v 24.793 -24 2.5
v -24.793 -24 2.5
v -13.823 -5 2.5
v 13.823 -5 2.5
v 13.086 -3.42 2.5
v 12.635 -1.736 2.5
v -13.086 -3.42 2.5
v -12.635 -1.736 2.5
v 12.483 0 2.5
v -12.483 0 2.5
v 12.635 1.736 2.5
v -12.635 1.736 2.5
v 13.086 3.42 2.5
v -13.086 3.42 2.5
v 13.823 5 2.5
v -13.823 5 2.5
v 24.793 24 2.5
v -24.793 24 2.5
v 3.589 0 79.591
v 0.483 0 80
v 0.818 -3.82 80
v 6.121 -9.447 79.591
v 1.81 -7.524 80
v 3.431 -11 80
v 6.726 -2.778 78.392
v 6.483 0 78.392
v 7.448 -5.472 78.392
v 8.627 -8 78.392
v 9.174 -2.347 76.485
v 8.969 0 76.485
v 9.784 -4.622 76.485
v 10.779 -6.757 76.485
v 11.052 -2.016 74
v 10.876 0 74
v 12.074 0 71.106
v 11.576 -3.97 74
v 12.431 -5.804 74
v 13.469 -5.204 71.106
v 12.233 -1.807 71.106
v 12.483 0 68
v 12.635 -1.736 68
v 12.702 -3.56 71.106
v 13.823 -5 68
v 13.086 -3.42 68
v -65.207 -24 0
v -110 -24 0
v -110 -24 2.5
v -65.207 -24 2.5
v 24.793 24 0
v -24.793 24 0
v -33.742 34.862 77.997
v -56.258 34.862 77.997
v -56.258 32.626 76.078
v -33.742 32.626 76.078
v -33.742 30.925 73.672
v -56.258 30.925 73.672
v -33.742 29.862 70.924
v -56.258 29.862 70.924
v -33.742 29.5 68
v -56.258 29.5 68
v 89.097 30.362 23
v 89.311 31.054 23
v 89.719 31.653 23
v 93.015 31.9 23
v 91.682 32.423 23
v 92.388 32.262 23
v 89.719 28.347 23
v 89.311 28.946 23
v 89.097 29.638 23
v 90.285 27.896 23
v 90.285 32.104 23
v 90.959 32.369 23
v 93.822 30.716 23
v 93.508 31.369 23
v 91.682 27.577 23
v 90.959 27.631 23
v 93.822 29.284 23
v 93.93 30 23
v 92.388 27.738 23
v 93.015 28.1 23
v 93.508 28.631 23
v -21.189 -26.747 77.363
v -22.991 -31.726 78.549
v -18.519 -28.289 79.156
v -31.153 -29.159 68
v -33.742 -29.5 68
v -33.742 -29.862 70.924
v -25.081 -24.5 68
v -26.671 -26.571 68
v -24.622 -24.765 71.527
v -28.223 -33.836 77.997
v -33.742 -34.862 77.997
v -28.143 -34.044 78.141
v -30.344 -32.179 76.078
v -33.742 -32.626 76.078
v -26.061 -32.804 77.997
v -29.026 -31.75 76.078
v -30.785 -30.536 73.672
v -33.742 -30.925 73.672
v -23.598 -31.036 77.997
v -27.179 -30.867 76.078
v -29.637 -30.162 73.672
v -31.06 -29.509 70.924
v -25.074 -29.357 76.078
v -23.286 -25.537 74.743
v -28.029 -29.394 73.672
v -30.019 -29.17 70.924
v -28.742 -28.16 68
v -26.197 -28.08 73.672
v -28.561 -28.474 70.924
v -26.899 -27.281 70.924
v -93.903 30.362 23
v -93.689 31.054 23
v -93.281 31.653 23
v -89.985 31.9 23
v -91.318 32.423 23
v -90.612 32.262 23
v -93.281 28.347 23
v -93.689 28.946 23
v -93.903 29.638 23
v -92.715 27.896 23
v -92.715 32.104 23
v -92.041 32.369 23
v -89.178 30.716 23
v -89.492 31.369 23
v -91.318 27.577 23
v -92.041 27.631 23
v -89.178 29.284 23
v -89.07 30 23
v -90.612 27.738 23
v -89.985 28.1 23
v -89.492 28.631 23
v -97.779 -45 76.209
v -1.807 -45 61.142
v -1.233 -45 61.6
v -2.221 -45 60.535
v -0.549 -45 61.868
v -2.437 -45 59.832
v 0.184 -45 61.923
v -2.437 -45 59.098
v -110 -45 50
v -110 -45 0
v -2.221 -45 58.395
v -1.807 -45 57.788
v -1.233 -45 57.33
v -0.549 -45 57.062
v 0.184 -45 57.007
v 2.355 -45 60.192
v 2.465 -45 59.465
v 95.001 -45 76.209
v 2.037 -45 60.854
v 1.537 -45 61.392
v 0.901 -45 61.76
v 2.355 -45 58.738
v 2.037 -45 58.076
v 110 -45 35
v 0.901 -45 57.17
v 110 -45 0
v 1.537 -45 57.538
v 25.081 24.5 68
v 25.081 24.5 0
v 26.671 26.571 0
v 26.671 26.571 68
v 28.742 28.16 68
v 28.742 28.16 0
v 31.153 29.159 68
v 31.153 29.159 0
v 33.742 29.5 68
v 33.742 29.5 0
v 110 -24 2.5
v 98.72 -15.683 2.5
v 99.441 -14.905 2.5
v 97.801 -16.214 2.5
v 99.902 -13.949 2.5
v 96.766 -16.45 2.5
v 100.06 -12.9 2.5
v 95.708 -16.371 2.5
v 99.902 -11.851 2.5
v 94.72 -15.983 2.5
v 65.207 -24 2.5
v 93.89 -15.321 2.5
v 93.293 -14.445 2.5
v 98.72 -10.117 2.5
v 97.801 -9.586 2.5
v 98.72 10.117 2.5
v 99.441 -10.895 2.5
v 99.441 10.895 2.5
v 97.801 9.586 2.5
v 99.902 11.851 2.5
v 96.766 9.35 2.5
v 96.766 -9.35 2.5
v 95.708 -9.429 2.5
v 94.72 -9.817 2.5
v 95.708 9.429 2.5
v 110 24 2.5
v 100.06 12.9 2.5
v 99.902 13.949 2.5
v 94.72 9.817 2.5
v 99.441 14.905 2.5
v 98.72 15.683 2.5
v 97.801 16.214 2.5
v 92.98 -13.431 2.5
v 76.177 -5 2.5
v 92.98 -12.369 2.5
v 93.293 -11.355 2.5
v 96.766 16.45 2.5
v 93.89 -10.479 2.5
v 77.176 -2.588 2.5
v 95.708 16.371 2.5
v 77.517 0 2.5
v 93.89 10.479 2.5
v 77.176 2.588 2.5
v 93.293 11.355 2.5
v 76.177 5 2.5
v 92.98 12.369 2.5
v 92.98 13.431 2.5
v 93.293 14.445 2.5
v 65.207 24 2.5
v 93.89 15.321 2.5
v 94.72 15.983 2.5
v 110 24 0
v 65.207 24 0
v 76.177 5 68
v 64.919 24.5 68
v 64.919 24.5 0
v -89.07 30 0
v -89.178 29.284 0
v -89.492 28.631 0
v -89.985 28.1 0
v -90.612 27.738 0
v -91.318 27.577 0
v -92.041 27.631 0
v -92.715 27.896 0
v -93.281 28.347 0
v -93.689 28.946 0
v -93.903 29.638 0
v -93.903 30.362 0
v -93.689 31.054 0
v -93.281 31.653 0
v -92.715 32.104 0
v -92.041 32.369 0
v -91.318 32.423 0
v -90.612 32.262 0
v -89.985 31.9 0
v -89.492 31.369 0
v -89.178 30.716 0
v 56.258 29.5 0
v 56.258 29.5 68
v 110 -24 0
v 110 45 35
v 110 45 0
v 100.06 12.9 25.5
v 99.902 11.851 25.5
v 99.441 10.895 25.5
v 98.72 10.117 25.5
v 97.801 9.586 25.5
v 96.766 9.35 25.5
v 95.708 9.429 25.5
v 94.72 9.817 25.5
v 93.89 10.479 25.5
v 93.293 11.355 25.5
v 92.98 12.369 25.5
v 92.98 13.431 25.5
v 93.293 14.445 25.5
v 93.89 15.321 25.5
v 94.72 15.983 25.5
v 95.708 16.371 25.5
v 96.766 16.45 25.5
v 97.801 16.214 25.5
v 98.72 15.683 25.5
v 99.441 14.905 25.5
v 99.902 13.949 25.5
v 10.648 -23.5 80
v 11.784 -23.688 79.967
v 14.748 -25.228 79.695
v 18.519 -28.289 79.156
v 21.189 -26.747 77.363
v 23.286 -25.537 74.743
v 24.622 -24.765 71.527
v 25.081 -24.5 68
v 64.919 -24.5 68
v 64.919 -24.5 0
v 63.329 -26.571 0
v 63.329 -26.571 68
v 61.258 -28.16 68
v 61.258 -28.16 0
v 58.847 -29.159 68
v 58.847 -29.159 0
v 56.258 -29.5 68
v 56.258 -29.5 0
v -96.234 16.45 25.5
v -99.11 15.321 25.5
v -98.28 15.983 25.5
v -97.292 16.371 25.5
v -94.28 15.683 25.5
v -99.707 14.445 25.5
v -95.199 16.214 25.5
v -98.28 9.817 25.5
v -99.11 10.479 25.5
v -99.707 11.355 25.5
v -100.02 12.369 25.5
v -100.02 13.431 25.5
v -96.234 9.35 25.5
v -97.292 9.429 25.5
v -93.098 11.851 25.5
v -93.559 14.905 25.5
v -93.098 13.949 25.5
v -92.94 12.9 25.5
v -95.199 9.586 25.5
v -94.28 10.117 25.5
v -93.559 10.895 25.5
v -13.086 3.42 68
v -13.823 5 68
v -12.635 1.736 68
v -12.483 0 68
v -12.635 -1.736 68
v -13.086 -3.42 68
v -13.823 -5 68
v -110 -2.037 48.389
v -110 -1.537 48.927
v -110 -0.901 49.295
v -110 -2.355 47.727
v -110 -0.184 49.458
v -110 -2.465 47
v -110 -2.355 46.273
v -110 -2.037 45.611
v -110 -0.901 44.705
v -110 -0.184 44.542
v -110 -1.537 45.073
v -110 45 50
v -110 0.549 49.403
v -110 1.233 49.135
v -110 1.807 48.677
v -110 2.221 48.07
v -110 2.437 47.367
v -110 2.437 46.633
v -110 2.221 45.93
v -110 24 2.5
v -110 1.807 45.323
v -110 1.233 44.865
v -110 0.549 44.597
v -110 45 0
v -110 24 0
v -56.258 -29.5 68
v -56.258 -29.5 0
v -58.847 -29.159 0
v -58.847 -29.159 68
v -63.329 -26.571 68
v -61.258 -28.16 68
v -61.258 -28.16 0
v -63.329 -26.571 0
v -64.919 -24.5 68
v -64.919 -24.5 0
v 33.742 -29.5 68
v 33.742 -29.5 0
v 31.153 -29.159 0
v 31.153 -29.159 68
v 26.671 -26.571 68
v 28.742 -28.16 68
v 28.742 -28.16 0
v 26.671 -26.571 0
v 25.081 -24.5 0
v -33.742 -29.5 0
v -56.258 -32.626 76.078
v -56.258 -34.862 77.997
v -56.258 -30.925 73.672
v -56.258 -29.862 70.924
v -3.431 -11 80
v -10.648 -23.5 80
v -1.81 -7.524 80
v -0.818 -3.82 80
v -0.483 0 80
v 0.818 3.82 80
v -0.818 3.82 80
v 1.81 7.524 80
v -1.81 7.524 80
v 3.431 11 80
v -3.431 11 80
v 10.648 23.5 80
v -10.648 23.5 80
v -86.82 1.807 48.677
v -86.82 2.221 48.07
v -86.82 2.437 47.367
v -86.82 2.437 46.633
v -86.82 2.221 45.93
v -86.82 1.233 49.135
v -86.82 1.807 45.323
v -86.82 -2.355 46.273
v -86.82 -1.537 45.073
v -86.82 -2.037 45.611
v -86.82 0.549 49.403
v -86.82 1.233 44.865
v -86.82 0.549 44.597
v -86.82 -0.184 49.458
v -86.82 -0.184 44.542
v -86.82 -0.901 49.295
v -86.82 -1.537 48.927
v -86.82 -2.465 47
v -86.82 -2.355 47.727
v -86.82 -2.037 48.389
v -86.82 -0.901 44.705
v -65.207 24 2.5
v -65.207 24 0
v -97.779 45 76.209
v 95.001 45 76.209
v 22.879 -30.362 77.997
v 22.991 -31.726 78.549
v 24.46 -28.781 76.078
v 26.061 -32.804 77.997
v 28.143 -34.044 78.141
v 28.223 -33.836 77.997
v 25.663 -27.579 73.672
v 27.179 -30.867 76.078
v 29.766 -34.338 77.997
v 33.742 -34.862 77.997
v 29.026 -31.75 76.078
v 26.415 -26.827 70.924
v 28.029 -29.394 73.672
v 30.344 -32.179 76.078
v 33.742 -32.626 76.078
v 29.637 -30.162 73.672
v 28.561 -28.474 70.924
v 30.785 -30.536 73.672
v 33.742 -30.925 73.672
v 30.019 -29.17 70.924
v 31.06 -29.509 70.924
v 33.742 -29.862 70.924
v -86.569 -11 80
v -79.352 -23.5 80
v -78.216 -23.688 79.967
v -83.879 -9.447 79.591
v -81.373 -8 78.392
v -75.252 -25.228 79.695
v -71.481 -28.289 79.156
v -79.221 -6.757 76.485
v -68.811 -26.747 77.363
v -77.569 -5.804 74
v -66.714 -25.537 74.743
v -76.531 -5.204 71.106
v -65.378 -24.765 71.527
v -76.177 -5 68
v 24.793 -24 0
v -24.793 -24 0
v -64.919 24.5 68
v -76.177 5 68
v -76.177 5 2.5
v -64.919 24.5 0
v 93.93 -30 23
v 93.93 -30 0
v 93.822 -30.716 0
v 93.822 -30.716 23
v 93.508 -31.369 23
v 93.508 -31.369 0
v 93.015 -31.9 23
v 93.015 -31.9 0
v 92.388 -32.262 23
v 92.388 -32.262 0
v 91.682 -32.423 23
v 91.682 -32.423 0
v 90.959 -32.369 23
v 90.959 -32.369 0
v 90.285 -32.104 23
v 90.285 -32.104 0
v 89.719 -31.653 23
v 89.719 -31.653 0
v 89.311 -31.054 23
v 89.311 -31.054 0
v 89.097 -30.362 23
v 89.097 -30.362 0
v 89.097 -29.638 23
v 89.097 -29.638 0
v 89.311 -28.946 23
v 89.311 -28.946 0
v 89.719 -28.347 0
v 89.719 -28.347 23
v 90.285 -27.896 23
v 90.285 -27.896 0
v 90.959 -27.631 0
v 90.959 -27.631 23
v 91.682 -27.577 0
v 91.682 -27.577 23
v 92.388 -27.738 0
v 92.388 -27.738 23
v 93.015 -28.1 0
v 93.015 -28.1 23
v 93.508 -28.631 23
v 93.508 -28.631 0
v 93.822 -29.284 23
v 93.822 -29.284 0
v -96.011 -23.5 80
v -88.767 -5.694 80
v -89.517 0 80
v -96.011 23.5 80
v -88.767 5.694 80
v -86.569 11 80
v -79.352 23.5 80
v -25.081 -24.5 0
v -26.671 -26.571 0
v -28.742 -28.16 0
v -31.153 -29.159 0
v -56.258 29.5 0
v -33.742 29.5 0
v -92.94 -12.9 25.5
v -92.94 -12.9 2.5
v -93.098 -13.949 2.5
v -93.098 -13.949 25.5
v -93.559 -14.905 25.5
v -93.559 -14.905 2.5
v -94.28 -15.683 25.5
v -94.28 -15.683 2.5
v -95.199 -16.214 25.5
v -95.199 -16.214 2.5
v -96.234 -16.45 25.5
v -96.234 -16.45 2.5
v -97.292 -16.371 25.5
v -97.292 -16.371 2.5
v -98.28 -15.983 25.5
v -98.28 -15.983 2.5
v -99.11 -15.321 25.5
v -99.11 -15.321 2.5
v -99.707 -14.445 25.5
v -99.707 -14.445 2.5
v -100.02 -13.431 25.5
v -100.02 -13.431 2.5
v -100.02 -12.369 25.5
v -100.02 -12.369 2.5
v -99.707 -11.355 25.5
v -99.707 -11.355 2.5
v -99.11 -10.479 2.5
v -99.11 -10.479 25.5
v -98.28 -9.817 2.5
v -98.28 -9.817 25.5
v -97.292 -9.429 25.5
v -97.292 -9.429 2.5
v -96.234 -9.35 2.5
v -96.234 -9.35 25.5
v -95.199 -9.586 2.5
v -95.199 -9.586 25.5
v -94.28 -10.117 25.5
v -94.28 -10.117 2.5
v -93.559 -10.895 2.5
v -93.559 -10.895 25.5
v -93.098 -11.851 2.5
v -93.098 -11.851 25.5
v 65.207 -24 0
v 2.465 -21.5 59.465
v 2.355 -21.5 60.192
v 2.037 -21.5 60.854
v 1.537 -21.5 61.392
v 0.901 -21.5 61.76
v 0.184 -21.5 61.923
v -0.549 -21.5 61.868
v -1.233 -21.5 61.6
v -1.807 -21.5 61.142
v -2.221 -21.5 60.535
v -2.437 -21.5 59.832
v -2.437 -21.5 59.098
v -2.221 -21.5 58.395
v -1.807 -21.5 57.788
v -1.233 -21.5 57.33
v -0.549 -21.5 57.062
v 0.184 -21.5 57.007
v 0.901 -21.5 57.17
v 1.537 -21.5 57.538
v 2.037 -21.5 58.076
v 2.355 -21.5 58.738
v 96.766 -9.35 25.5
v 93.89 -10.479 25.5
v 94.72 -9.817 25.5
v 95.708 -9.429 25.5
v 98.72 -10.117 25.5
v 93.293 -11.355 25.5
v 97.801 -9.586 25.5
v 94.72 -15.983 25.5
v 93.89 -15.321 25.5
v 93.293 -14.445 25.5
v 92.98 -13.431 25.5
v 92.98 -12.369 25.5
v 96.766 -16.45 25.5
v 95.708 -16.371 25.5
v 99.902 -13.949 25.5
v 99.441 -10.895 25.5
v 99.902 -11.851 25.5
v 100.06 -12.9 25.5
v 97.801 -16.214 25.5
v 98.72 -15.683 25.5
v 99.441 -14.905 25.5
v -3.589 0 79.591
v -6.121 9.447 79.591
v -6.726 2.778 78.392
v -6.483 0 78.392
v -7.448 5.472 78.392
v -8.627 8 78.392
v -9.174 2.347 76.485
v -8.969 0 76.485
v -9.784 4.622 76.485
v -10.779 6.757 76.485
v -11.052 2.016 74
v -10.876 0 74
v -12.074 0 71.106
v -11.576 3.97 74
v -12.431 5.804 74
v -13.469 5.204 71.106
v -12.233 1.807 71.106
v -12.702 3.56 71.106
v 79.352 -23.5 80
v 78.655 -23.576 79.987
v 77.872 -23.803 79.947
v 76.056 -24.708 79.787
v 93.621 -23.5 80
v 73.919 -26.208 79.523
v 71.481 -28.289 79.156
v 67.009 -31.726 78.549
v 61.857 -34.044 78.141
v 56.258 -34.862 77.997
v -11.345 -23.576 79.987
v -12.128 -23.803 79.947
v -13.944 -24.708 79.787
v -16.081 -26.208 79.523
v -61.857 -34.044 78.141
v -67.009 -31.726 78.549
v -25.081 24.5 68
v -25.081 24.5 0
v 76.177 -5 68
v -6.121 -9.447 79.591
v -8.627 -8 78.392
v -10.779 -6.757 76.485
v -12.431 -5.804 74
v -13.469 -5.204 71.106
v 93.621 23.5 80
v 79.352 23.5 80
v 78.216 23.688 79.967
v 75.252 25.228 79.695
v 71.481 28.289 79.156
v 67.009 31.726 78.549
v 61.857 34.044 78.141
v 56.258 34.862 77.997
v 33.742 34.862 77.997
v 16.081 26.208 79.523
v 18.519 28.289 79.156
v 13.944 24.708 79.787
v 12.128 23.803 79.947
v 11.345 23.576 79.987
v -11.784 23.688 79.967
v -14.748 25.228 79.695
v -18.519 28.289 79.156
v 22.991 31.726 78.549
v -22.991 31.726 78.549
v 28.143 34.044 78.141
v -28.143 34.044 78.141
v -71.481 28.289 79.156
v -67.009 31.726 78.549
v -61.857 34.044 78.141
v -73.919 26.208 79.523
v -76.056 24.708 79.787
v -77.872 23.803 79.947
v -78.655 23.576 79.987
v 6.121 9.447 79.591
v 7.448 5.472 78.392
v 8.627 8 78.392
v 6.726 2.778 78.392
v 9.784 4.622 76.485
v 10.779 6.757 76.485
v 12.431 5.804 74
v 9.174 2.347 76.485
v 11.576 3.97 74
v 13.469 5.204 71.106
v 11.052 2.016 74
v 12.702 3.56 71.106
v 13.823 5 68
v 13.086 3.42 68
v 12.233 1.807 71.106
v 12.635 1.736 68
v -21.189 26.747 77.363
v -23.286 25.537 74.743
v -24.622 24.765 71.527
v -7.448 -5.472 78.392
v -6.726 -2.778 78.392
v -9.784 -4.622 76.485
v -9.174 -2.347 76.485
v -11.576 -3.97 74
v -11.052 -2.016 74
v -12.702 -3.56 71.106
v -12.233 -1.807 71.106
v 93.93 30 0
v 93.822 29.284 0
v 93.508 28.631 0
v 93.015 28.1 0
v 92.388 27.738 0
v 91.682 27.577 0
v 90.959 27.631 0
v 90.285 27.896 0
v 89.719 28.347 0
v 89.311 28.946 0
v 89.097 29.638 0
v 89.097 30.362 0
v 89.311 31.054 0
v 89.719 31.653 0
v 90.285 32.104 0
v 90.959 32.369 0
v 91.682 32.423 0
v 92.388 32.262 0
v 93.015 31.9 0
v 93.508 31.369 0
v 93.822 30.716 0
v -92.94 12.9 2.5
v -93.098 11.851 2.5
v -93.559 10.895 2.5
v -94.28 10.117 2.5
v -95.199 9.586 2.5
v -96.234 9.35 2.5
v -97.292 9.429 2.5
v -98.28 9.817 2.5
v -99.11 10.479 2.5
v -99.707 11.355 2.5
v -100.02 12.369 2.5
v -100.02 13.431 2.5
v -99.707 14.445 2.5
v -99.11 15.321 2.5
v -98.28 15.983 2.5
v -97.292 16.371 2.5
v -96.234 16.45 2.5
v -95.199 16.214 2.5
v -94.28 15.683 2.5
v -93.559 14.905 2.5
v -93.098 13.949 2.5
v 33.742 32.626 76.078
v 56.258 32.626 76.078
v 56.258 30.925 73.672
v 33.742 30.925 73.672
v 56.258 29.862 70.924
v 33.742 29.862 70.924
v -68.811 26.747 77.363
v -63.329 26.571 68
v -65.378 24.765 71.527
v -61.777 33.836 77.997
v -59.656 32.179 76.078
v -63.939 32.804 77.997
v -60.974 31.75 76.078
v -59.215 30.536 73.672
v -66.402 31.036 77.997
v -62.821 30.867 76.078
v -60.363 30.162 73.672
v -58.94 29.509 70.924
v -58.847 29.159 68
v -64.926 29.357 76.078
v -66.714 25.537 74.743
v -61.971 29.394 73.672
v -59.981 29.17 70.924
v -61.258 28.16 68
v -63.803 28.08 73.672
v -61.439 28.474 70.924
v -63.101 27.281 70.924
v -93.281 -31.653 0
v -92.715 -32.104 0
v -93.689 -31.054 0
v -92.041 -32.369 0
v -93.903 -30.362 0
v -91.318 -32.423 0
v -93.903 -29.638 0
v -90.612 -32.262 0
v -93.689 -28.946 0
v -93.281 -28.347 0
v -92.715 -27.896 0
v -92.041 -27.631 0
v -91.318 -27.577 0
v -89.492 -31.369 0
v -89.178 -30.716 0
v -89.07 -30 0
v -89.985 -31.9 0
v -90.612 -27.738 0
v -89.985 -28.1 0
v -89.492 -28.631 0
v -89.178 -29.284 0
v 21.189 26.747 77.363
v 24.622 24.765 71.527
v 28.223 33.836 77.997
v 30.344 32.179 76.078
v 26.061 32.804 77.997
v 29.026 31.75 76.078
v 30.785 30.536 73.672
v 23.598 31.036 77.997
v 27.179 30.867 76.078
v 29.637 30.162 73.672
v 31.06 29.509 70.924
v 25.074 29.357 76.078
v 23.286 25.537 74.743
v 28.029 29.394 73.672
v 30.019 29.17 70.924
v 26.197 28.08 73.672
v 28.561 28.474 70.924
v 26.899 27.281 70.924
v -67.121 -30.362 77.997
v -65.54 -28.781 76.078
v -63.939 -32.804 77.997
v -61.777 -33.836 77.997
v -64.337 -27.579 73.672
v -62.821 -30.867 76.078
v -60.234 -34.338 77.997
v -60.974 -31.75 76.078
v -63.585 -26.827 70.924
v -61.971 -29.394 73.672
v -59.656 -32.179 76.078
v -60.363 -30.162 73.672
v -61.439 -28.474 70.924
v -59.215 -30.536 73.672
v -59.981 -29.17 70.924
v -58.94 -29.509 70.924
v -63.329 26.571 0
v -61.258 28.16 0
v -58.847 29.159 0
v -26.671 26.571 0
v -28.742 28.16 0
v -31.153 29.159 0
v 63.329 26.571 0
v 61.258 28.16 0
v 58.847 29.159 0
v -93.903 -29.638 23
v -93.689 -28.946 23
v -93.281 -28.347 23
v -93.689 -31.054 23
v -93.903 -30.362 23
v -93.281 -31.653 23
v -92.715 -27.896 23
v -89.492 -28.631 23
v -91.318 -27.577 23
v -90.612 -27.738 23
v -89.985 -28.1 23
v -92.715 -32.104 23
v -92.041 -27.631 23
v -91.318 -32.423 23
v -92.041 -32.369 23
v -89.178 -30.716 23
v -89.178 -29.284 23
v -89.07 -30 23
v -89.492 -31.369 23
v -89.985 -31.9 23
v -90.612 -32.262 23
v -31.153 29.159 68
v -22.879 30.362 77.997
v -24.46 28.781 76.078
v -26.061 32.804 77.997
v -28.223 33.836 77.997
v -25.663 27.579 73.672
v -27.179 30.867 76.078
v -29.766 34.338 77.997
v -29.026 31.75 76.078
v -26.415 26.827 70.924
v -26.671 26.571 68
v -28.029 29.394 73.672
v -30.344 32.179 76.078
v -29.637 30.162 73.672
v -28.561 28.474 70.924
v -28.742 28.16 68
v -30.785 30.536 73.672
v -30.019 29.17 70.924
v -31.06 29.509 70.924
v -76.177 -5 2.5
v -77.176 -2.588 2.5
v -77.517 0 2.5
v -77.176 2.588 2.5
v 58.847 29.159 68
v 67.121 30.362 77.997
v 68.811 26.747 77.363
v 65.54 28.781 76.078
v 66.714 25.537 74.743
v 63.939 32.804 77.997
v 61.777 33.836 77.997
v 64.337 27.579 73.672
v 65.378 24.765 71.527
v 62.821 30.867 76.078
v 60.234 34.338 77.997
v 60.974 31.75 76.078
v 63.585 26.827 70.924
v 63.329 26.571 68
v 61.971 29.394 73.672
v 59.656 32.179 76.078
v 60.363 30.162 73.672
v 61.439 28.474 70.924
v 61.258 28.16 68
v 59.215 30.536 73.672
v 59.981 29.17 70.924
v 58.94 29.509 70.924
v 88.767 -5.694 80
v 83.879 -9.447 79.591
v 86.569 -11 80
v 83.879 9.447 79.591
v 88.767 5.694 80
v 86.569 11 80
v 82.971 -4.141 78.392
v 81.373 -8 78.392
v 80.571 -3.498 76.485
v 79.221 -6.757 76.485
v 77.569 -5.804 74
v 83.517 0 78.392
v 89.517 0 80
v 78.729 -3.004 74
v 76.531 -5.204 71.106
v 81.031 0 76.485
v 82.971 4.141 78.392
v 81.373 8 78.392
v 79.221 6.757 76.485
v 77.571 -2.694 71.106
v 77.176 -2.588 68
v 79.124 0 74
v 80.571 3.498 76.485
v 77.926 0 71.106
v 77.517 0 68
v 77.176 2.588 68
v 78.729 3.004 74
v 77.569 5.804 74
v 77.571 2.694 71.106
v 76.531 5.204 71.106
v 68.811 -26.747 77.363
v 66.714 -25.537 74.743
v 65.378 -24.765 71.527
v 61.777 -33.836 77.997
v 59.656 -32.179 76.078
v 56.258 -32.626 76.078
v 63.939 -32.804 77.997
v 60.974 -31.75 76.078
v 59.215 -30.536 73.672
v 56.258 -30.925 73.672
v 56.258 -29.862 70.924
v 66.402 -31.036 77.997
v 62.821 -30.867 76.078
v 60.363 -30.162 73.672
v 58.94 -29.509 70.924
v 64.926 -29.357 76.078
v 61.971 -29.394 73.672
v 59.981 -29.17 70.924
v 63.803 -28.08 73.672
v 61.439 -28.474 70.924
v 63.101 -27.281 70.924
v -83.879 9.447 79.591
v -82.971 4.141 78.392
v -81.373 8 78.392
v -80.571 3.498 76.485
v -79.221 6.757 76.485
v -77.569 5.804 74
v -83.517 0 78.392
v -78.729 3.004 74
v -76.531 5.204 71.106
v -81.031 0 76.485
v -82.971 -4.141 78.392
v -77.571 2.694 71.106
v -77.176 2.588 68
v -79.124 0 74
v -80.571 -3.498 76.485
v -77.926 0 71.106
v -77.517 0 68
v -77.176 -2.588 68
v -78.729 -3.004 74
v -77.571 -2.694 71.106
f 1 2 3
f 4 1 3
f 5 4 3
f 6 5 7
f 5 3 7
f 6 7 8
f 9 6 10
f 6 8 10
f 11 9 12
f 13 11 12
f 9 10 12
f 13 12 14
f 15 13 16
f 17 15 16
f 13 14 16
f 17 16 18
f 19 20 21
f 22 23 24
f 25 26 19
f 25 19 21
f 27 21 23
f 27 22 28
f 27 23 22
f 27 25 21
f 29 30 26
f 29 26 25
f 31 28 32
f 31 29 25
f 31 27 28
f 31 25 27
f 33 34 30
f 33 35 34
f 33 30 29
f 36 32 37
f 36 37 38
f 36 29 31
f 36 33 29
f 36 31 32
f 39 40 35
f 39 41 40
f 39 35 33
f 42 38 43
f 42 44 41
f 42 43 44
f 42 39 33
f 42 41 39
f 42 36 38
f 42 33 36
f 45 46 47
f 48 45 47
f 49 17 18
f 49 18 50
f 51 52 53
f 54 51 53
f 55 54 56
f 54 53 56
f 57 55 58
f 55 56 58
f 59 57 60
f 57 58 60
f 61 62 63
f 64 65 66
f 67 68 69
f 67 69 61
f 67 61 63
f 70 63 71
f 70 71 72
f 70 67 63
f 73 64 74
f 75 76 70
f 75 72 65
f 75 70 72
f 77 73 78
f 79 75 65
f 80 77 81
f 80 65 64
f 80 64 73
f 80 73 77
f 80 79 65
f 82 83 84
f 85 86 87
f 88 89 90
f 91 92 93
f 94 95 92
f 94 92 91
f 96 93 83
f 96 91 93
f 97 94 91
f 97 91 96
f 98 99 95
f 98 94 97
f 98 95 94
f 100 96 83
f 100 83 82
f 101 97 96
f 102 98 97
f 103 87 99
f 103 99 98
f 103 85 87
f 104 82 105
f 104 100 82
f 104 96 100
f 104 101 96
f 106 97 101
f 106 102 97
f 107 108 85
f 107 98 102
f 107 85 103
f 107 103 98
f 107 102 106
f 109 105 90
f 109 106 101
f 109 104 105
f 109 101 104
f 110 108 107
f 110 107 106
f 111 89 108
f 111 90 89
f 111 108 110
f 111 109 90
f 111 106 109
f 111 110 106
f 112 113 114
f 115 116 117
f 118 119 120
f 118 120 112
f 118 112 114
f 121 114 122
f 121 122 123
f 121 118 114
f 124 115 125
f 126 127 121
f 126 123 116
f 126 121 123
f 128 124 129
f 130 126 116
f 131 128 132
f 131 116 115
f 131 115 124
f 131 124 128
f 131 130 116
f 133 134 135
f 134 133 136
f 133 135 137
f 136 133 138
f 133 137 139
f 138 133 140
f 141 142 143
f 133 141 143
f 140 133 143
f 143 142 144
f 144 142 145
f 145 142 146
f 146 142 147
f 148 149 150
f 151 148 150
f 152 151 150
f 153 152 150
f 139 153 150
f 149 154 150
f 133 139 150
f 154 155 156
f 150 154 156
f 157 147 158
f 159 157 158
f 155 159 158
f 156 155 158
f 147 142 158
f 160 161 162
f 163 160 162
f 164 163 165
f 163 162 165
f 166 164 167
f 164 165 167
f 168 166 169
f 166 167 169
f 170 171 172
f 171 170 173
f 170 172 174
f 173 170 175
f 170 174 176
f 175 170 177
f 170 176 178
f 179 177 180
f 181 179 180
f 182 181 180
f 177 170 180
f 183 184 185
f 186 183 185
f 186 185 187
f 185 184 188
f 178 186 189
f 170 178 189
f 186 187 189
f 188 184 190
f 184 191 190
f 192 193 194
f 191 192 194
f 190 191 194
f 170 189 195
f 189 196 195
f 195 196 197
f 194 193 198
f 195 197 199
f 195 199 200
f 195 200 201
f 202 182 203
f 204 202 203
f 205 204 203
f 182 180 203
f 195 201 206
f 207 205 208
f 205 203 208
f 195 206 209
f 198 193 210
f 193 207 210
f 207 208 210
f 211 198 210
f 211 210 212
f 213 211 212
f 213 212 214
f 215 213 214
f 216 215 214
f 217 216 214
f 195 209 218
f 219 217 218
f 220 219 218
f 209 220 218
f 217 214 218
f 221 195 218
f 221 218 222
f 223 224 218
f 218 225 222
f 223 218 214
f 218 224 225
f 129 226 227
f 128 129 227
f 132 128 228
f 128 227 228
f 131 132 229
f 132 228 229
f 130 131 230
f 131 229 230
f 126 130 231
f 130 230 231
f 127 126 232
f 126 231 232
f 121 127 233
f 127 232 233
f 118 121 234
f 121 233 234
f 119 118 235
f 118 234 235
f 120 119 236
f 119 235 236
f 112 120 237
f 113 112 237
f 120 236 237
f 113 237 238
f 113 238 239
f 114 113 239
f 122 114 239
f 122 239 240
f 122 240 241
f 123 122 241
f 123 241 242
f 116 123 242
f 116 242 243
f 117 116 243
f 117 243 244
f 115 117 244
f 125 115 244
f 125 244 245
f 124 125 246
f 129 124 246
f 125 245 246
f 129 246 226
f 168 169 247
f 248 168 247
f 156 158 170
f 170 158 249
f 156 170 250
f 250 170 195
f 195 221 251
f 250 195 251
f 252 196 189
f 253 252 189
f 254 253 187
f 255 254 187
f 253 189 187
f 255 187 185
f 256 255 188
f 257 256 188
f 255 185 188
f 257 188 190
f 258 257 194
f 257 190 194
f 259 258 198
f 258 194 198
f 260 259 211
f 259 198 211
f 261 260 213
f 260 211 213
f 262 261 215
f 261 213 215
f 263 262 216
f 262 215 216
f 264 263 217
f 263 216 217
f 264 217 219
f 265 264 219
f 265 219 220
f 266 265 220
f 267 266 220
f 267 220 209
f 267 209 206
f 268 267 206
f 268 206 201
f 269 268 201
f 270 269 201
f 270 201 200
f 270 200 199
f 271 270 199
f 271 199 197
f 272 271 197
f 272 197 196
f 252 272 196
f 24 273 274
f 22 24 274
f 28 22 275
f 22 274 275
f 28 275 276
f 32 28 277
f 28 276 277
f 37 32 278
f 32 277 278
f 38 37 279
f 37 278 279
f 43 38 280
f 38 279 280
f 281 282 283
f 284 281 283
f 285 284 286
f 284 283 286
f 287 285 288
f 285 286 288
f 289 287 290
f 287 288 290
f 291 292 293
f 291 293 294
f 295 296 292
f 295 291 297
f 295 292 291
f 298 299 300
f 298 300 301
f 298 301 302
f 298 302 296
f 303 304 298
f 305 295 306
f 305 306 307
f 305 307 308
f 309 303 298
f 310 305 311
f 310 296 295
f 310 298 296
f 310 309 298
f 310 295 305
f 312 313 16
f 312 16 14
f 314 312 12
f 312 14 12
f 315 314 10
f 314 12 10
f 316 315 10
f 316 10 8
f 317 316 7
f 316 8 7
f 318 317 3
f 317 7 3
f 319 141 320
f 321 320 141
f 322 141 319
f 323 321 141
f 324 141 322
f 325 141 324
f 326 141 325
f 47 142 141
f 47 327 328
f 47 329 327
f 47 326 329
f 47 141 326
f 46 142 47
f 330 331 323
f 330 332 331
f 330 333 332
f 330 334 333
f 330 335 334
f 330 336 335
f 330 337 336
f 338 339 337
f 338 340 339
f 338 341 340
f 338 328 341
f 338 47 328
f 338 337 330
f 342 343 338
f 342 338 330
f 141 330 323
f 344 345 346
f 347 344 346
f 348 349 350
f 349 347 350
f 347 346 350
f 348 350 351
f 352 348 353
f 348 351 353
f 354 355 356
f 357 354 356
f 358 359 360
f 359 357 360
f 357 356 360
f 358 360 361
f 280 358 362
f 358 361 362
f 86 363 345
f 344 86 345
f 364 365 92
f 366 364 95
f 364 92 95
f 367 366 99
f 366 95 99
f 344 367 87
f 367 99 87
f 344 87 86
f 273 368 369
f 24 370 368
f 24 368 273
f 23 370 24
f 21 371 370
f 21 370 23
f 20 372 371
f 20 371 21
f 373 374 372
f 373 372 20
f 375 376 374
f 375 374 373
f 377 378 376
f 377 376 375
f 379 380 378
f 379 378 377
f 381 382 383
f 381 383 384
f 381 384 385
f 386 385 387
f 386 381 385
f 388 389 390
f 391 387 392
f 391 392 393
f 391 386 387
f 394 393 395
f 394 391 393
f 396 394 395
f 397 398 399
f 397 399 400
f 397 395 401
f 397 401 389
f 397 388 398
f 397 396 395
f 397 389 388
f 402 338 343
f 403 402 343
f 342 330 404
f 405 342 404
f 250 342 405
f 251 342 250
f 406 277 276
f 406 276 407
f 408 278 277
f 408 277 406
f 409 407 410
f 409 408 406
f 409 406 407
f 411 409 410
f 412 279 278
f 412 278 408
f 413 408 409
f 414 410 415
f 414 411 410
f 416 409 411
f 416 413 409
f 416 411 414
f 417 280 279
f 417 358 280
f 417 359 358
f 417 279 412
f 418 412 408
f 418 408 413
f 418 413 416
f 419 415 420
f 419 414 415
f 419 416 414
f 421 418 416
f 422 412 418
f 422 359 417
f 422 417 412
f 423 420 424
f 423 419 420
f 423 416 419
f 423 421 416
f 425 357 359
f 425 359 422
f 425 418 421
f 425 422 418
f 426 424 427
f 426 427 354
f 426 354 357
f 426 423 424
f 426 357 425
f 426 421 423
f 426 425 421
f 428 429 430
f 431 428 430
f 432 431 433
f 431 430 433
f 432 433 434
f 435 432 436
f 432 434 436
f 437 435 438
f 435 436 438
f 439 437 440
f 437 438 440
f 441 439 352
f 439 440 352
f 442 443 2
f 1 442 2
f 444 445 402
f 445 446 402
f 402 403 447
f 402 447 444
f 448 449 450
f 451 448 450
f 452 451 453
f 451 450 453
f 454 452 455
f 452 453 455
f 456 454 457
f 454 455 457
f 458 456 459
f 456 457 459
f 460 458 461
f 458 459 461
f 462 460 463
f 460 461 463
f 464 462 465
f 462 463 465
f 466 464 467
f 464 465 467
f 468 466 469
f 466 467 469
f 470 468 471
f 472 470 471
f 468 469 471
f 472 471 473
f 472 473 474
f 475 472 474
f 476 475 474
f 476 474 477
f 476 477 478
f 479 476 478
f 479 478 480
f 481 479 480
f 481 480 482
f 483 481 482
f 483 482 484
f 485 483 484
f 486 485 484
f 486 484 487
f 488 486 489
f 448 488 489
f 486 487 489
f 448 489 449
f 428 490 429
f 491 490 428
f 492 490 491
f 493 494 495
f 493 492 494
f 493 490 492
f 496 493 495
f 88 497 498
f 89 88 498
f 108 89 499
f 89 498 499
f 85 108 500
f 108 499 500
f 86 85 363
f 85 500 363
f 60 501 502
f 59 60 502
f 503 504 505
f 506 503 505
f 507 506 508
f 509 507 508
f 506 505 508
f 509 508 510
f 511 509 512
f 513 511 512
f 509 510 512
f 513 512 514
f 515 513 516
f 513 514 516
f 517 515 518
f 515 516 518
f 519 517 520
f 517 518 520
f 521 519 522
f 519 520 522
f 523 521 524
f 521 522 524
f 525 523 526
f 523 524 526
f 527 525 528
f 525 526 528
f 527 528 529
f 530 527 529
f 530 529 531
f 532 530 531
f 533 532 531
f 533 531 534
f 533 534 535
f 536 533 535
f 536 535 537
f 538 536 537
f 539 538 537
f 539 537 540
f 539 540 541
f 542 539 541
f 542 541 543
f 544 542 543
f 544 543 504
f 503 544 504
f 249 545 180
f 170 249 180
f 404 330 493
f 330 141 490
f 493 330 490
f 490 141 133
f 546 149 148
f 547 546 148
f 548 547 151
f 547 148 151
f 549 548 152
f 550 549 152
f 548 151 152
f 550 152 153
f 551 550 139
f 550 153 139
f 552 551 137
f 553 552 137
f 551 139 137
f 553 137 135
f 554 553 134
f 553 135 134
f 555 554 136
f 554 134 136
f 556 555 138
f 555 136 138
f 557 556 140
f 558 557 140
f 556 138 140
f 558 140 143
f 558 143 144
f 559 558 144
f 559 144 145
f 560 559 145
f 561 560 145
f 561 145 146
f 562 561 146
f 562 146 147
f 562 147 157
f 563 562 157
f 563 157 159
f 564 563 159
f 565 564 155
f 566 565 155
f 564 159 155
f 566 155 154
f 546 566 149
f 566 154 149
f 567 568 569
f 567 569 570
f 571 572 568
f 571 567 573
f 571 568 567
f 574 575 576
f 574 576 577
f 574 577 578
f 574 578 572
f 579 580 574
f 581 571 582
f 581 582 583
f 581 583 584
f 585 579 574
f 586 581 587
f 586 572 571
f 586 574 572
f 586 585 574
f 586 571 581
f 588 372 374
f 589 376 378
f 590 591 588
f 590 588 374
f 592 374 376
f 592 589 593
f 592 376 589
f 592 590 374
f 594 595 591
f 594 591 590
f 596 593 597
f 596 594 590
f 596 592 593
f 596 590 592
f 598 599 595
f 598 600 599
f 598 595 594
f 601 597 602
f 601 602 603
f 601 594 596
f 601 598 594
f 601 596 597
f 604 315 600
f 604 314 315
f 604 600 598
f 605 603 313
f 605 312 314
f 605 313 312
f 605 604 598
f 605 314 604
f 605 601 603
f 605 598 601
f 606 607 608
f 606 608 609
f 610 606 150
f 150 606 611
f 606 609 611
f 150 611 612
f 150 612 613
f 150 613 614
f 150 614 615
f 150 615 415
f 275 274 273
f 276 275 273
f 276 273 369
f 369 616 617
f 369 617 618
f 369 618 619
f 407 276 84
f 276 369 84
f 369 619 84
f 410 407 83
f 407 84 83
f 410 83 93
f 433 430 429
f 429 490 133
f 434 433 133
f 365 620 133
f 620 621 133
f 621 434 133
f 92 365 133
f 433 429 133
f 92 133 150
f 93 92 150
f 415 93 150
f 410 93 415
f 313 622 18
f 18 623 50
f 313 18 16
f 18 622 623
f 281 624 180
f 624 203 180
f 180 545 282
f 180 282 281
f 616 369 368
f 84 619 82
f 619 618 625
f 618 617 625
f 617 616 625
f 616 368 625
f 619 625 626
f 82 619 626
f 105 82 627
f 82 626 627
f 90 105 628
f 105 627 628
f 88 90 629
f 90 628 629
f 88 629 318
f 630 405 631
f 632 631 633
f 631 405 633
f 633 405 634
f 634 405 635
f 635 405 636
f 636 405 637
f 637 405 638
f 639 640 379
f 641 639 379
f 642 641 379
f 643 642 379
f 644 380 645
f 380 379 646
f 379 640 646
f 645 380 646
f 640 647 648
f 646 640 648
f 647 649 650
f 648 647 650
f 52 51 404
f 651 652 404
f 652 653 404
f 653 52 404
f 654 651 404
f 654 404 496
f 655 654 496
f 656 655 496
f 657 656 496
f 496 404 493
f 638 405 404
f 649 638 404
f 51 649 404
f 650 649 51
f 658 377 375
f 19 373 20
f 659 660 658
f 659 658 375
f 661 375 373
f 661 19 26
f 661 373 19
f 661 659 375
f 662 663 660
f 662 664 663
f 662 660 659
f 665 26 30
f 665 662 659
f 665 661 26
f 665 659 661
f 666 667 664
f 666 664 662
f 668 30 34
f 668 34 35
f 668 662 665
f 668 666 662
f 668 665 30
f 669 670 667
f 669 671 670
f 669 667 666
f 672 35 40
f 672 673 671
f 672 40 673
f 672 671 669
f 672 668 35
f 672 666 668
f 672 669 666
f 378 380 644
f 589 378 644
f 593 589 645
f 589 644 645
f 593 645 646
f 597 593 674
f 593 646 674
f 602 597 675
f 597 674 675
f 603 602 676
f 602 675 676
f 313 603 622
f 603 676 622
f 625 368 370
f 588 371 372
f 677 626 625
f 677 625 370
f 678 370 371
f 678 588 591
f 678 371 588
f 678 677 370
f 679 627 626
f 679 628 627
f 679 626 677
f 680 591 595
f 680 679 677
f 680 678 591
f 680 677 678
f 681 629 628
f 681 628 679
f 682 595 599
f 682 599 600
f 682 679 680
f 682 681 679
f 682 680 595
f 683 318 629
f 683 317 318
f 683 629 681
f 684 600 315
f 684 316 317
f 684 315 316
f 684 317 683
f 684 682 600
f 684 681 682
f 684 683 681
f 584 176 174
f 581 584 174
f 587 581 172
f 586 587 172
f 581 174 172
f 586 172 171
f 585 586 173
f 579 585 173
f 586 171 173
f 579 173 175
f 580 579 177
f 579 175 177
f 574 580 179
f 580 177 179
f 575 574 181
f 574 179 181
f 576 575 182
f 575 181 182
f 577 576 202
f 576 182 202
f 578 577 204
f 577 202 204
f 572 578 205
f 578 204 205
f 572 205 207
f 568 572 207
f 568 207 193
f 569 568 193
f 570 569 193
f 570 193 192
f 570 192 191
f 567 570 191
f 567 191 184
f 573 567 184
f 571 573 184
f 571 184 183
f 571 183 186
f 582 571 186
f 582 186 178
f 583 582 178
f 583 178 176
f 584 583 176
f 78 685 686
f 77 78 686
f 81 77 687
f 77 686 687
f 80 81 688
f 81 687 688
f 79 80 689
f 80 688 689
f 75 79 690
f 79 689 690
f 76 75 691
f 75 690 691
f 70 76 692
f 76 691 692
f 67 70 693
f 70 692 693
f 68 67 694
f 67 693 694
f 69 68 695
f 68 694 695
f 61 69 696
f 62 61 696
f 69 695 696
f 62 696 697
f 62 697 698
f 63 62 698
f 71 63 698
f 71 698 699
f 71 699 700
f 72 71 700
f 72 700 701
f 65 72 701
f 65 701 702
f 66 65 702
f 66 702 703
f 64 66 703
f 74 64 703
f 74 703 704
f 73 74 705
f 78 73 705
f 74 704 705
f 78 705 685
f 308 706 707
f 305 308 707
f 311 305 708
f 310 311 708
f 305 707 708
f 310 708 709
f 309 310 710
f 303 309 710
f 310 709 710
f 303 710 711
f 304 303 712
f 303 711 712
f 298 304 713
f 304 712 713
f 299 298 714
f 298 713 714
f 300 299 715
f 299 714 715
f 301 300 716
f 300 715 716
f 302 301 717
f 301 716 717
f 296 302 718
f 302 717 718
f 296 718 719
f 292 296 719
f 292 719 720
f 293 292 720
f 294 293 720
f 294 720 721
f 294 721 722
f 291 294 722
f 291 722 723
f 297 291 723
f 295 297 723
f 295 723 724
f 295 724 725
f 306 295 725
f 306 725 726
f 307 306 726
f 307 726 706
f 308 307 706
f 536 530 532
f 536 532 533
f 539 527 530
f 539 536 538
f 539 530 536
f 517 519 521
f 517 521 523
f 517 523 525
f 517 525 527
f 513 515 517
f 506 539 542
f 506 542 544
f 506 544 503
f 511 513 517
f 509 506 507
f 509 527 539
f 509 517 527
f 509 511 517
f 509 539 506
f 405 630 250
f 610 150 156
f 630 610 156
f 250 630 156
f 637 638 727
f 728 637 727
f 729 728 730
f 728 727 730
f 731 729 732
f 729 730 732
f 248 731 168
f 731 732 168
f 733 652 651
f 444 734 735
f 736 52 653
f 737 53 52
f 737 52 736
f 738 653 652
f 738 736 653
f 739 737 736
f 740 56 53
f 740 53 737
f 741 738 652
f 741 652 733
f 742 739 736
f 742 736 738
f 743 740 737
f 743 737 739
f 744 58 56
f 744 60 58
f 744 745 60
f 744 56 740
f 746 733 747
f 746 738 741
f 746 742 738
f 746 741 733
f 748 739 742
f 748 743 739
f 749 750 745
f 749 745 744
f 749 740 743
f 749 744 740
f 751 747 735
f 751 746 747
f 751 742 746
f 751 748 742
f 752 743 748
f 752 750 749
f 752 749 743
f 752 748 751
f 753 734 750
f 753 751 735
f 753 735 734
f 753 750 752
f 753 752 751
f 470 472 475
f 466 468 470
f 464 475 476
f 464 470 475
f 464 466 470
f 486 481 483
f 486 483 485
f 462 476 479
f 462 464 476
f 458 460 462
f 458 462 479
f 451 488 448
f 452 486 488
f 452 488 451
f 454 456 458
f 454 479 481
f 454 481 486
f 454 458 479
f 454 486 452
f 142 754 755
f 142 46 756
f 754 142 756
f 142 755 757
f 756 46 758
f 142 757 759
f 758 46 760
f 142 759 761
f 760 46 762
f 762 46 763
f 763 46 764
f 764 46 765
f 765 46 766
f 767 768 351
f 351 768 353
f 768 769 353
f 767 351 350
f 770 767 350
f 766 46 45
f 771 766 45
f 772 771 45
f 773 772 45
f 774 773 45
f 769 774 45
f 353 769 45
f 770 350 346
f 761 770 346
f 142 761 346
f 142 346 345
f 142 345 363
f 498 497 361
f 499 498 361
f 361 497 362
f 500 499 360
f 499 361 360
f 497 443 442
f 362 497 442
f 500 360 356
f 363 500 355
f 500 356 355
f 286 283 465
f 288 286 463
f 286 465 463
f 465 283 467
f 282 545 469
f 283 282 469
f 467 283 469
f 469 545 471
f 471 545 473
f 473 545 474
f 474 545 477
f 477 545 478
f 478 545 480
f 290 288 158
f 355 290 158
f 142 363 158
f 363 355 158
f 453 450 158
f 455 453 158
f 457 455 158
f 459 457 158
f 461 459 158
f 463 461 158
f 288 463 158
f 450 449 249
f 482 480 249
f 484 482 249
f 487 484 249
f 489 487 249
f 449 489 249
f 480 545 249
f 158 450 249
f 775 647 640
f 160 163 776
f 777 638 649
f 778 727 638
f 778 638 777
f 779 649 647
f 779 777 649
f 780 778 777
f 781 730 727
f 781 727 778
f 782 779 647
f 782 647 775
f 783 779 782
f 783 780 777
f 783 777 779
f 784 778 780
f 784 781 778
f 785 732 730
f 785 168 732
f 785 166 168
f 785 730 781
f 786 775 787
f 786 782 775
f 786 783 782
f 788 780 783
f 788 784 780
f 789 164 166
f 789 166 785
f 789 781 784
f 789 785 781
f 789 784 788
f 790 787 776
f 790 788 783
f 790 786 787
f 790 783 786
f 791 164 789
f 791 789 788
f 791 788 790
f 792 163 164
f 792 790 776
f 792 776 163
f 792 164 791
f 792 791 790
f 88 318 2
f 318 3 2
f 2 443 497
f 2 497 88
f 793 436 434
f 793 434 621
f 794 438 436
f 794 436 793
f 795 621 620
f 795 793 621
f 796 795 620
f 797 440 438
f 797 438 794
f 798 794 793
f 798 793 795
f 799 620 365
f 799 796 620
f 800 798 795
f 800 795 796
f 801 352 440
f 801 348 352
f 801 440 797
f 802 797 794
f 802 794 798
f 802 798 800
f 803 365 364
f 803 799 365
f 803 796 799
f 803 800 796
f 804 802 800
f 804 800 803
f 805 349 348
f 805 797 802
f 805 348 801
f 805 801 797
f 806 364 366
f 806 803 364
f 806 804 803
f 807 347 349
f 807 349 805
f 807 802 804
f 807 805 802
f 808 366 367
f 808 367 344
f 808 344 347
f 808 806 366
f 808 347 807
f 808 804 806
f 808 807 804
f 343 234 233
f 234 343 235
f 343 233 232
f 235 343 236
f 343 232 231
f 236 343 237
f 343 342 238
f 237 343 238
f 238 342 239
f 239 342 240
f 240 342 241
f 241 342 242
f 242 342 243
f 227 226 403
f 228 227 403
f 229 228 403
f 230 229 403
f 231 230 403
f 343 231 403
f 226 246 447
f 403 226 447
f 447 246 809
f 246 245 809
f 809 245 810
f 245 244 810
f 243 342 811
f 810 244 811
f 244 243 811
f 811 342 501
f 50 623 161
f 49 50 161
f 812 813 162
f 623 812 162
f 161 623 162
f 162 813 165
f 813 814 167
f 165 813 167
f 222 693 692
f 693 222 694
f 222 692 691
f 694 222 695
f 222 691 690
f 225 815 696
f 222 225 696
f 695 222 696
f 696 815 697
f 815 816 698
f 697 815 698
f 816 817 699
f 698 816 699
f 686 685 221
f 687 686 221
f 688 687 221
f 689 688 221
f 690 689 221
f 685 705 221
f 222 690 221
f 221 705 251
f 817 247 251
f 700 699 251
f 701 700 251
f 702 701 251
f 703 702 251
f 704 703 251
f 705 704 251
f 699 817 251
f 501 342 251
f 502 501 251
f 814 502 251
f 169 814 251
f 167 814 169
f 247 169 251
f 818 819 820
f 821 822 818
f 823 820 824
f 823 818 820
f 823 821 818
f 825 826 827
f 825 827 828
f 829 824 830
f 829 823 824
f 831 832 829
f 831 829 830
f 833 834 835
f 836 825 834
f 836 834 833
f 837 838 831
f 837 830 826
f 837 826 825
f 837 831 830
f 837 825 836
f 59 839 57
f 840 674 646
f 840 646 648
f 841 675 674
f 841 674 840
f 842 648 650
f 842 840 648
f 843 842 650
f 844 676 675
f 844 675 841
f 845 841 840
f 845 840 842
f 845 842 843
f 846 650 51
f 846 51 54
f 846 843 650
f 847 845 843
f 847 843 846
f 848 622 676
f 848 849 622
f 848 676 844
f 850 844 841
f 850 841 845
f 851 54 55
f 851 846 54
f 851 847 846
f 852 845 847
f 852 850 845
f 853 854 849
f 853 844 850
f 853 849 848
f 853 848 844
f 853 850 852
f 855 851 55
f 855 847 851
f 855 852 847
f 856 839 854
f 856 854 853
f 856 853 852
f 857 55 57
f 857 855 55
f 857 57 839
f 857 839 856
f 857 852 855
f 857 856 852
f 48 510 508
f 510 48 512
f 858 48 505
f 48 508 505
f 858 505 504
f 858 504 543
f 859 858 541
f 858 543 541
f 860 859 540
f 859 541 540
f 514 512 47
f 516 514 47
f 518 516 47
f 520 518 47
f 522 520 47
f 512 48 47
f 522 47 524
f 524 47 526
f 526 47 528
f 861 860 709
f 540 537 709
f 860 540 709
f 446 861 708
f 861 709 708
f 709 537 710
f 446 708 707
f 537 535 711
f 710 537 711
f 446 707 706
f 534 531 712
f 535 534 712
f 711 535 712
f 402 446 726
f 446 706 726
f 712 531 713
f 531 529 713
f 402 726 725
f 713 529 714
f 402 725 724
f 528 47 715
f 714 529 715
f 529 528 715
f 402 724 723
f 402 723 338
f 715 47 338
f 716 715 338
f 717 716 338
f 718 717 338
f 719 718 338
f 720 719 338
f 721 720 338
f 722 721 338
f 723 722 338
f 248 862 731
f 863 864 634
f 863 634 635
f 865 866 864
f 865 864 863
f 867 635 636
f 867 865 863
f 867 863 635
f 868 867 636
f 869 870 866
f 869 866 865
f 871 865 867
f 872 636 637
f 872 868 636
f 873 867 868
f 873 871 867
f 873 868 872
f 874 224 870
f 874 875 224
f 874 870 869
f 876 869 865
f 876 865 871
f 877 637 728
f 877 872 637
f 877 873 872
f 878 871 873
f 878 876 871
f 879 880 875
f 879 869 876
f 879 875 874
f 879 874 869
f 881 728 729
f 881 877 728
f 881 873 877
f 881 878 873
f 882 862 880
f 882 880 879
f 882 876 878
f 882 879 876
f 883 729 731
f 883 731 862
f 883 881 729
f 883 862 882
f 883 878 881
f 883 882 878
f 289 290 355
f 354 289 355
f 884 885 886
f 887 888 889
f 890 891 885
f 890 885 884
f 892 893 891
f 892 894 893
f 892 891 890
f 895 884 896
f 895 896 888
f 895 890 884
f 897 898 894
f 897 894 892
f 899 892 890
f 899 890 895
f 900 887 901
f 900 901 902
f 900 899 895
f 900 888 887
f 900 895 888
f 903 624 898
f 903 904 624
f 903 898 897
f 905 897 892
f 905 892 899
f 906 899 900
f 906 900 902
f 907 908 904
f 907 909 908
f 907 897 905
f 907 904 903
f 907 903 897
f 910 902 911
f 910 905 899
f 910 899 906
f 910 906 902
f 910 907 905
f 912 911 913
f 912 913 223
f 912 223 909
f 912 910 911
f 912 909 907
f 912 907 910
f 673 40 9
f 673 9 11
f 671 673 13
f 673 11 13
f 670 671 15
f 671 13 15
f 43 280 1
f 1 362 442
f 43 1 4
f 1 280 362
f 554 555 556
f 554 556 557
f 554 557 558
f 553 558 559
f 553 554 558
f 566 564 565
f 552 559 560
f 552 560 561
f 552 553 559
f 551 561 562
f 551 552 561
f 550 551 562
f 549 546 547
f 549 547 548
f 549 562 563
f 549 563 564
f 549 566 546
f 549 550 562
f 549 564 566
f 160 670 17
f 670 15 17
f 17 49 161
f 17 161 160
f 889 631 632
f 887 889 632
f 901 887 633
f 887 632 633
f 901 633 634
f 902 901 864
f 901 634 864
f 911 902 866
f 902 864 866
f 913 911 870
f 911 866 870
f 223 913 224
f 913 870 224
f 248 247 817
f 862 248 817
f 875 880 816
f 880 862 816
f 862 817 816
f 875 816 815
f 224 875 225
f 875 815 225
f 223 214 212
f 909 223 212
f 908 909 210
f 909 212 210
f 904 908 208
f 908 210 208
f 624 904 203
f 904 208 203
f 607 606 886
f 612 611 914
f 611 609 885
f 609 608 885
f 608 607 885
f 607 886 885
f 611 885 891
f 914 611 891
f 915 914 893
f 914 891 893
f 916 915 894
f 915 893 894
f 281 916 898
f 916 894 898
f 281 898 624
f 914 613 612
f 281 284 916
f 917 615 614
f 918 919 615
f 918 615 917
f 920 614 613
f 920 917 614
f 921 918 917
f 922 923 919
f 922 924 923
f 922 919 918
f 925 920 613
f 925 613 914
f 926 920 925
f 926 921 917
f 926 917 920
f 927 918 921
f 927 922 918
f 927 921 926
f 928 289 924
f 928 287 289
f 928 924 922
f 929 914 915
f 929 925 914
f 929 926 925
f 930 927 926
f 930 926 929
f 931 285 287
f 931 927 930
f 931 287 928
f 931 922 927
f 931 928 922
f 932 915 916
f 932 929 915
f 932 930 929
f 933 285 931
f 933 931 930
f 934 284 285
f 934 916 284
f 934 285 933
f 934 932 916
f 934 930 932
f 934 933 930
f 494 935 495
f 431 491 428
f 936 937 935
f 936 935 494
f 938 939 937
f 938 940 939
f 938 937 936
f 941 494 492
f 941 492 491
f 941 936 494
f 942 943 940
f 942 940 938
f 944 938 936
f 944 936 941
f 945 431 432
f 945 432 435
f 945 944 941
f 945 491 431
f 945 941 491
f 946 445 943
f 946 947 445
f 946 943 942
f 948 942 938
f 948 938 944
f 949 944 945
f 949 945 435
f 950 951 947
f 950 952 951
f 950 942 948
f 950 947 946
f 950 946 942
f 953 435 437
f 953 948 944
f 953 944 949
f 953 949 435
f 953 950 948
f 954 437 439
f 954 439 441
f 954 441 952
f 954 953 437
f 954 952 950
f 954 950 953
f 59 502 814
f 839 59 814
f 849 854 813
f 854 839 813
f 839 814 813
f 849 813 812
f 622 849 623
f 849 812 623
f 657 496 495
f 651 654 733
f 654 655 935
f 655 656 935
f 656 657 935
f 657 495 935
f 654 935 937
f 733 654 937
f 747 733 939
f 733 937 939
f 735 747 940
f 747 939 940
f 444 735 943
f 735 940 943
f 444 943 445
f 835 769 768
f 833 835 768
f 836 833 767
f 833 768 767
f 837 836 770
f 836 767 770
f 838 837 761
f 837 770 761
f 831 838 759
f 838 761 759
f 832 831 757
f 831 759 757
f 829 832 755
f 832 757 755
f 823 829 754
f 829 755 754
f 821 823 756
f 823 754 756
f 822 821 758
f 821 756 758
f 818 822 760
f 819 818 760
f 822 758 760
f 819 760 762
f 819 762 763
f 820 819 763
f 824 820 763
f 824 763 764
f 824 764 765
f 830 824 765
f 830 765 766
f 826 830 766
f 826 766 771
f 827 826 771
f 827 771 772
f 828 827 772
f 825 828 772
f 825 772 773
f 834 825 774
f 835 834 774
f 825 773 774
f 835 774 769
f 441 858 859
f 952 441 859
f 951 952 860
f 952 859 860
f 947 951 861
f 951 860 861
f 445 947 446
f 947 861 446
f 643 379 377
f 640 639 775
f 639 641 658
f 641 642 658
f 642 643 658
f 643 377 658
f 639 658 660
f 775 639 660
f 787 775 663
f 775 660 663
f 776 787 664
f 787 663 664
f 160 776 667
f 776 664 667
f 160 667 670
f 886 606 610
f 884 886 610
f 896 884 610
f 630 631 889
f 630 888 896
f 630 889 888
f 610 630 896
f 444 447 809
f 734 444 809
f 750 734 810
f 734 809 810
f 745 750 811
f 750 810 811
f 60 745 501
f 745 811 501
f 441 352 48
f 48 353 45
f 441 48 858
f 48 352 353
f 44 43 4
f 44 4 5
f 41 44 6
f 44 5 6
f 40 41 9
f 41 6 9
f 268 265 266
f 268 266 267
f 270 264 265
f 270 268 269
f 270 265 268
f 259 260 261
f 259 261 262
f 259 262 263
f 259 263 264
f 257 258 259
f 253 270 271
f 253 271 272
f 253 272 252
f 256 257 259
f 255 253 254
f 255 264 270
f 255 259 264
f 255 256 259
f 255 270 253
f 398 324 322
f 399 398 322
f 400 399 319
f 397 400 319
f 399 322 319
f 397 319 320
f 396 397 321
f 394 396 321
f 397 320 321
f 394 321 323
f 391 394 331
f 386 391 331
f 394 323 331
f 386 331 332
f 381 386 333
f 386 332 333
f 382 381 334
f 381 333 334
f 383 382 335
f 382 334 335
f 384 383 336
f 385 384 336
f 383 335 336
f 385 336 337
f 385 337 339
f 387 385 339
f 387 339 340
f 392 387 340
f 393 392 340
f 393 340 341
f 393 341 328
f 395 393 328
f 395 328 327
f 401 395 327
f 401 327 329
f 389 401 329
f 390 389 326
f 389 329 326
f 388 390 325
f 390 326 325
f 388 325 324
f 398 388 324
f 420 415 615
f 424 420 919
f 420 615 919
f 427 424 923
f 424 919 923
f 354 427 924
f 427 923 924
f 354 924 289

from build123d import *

# Parameters (mm, degrees)
F0_W      = 220
F0_H      = 90
F1_DEPTH  = 80
F3_DEPTH  = 80.001
F4_R      = 12
F6_DEPTH  = 90
F8_DEPTH  = 220.001
F9_R      = 2.465
F10_DEPTH = 23.18
F11_R     = 2.465
F12_DEPTH = 23.5
F13_R     = 2.43
F14_DEPTH = 23
F13_R_2   = 3.56
F15_DEPTH = 25.5


# Not quite as in the source:
# - a feature names something its author has since deleted; it is built from what else it names


with BuildPart() as f1:
    # F0 (on Top) → F1 (new body)
    with BuildSketch(Plane.XY):
        Rectangle(F0_W, F0_H)
    extrude(amount=F1_DEPTH)

    # F2 (on face) → F3 (cut, through all)
    with BuildSketch(Plane(origin=(0, 0, 0), x_dir=(1, 0, 0), z_dir=(0, 0, -1))):
        with BuildLine():
            ThreePointArc((-13.8230854638, -5), (-12.8240812387, -2.588190451), (-12.4833395016, 0))
            Line((-12.4833395016, 0), (-45, 0))
            Line((-45, 0), (-45, 29.5))
            Line((-45, 29.5), (-56.2583302492, 29.5))
            ThreePointArc((-56.2583302492, 29.5), (-61.2583302492, 28.1602540378), (-64.918584287, 24.5))
            Line((-64.918584287, 24.5), (-76.1769145362, 5))
            ThreePointArc((-76.1769145362, 5), (-77.5166604984, 0), (-76.1769145362, -5))
            Line((-76.1769145362, -5), (-64.918584287, -24.5))
            ThreePointArc((-64.918584287, -24.5), (-61.2583302492, -28.1602540378), (-56.2583302492, -29.5))
            Line((-56.2583302492, -29.5), (-33.7416697508, -29.5))
            ThreePointArc((-33.7416697508, -29.5), (-28.7416697508, -28.1602540378), (-25.081415713, -24.5))
            Line((-25.081415713, -24.5), (-13.8230854638, -5))
        make_face()
        with BuildLine():
            Line((-45, 0), (-12.4833395016, 0))
            ThreePointArc((-12.4833395016, 0), (-12.8240812387, 2.588190451), (-13.8230854638, 5))
            Line((-13.8230854638, 5), (-25.081415713, 24.5))
            ThreePointArc((-25.081415713, 24.5), (-28.7416697508, 28.1602540378), (-33.7416697508, 29.5))
            Line((-33.7416697508, 29.5), (-45, 29.5))
            Line((-45, 29.5), (-45, 0))
        make_face()
        with BuildLine():
            ThreePointArc((13.8230854638, 5), (12.8240812387, 2.588190451), (12.4833395016, 0))
            Line((12.4833395016, 0), (45, 0))
            Line((45, 0), (45, 29.5))
            Line((45, 29.5), (33.7416697508, 29.5))
            ThreePointArc((33.7416697508, 29.5), (28.7416697508, 28.1602540378), (25.081415713, 24.5))
            Line((25.081415713, 24.5), (13.8230854638, 5))
        make_face()
        with BuildLine():
            Line((45, 0), (12.4833395016, 0))
            ThreePointArc((12.4833395016, 0), (12.8240812387, -2.588190451), (13.8230854638, -5))
            Line((13.8230854638, -5), (25.081415713, -24.5))
            ThreePointArc((25.081415713, -24.5), (28.7416697508, -28.1602540378), (33.7416697508, -29.5))
            Line((33.7416697508, -29.5), (56.2583302492, -29.5))
            ThreePointArc((56.2583302492, -29.5), (61.2583302492, -28.1602540378), (64.918584287, -24.5))
            Line((64.918584287, -24.5), (76.1769145362, -5))
            ThreePointArc((76.1769145362, -5), (77.5166604984, 0), (76.1769145362, 5))
            Line((76.1769145362, 5), (64.918584287, 24.5))
            ThreePointArc((64.918584287, 24.5), (61.2583302492, 28.1602540378), (56.2583302492, 29.5))
            Line((56.2583302492, 29.5), (45, 29.5))
            Line((45, 29.5), (45, 0))
        make_face()
    extrude(amount=-F3_DEPTH, mode=Mode.SUBTRACT)

    # F4
    f4_edges = [f1.edges().sort_by_distance(p)[0] for p in [
        (-45, 29.5, 80),
        (45, 29.5, 80),
    ]]
    fillet(f4_edges, radius=F4_R)

    # F5 (on face) → F6 (cut)
    with BuildSketch(Plane.XZ.offset(45)):
        Polygon((-110, 80), (-110, 50), (-96.0107702554, 80), align=None)
        Polygon((110, 80), (93.621339458, 80), (110, 35), align=None)
    extrude(amount=-F6_DEPTH, mode=Mode.SUBTRACT)

    # F7 (on face) → F8 (cut, through all)
    with BuildSketch(Plane(origin=(-110, 0, 0), x_dir=(0, -1, 0), z_dir=(-1, 0, 0))):
        Polygon((-23.5, 80), (-45, 80), (-45, 76.2089699148), align=None)
        Polygon((23.5, 80), (45, 76.2089699148), (45, 78.1686380506), (45, 80), align=None)
        Polygon((-24, 0), (0, 0), (24, 0), (24, 2.5), (-24, 2.5), align=None)
    extrude(amount=-F8_DEPTH, mode=Mode.SUBTRACT)

    # F9 (on face) → F10 (cut)
    with BuildSketch(Plane(origin=(-110, 0, 0), x_dir=(0, -1, 0), z_dir=(-1, 0, 0))):
        with Locations((0, 47)):
            Circle(F9_R)
    extrude(amount=-F10_DEPTH, mode=Mode.SUBTRACT)

    # F11 (on face) → F12 (cut)
    with BuildSketch(Plane.XZ.offset(45)):
        with Locations((0, 59.465)):
            Circle(F11_R)
    extrude(amount=-F12_DEPTH, mode=Mode.SUBTRACT)

    # F13 (on face) → F14 (cut)
    with BuildSketch(Plane(origin=(0, 0, 0), x_dir=(1, 0, 0), z_dir=(0, 0, -1))):
        with Locations((-91.5, 30)):
            Circle(F13_R)
        with Locations((91.5, 30)):
            Circle(F13_R)
        with Locations((91.5, -30)):
            Circle(F13_R)
        with Locations((-91.5, -30)):
            Circle(F13_R)
    extrude(amount=-F14_DEPTH, mode=Mode.SUBTRACT)

    # F13 (on face) → F15 (cut)
    with BuildSketch(Plane(origin=(0, 0, 0), x_dir=(1, 0, 0), z_dir=(0, 0, -1))):
        with Locations((-96.5, 12.9)):
            Circle(F13_R_2)
        with Locations((-96.5, -12.9)):
            Circle(F13_R_2)
        with Locations((96.5, -12.9)):
            Circle(F13_R_2)
        with Locations((96.5, 12.9)):
            Circle(F13_R_2)
    extrude(amount=-F15_DEPTH, mode=Mode.SUBTRACT)


solid = f1.part
